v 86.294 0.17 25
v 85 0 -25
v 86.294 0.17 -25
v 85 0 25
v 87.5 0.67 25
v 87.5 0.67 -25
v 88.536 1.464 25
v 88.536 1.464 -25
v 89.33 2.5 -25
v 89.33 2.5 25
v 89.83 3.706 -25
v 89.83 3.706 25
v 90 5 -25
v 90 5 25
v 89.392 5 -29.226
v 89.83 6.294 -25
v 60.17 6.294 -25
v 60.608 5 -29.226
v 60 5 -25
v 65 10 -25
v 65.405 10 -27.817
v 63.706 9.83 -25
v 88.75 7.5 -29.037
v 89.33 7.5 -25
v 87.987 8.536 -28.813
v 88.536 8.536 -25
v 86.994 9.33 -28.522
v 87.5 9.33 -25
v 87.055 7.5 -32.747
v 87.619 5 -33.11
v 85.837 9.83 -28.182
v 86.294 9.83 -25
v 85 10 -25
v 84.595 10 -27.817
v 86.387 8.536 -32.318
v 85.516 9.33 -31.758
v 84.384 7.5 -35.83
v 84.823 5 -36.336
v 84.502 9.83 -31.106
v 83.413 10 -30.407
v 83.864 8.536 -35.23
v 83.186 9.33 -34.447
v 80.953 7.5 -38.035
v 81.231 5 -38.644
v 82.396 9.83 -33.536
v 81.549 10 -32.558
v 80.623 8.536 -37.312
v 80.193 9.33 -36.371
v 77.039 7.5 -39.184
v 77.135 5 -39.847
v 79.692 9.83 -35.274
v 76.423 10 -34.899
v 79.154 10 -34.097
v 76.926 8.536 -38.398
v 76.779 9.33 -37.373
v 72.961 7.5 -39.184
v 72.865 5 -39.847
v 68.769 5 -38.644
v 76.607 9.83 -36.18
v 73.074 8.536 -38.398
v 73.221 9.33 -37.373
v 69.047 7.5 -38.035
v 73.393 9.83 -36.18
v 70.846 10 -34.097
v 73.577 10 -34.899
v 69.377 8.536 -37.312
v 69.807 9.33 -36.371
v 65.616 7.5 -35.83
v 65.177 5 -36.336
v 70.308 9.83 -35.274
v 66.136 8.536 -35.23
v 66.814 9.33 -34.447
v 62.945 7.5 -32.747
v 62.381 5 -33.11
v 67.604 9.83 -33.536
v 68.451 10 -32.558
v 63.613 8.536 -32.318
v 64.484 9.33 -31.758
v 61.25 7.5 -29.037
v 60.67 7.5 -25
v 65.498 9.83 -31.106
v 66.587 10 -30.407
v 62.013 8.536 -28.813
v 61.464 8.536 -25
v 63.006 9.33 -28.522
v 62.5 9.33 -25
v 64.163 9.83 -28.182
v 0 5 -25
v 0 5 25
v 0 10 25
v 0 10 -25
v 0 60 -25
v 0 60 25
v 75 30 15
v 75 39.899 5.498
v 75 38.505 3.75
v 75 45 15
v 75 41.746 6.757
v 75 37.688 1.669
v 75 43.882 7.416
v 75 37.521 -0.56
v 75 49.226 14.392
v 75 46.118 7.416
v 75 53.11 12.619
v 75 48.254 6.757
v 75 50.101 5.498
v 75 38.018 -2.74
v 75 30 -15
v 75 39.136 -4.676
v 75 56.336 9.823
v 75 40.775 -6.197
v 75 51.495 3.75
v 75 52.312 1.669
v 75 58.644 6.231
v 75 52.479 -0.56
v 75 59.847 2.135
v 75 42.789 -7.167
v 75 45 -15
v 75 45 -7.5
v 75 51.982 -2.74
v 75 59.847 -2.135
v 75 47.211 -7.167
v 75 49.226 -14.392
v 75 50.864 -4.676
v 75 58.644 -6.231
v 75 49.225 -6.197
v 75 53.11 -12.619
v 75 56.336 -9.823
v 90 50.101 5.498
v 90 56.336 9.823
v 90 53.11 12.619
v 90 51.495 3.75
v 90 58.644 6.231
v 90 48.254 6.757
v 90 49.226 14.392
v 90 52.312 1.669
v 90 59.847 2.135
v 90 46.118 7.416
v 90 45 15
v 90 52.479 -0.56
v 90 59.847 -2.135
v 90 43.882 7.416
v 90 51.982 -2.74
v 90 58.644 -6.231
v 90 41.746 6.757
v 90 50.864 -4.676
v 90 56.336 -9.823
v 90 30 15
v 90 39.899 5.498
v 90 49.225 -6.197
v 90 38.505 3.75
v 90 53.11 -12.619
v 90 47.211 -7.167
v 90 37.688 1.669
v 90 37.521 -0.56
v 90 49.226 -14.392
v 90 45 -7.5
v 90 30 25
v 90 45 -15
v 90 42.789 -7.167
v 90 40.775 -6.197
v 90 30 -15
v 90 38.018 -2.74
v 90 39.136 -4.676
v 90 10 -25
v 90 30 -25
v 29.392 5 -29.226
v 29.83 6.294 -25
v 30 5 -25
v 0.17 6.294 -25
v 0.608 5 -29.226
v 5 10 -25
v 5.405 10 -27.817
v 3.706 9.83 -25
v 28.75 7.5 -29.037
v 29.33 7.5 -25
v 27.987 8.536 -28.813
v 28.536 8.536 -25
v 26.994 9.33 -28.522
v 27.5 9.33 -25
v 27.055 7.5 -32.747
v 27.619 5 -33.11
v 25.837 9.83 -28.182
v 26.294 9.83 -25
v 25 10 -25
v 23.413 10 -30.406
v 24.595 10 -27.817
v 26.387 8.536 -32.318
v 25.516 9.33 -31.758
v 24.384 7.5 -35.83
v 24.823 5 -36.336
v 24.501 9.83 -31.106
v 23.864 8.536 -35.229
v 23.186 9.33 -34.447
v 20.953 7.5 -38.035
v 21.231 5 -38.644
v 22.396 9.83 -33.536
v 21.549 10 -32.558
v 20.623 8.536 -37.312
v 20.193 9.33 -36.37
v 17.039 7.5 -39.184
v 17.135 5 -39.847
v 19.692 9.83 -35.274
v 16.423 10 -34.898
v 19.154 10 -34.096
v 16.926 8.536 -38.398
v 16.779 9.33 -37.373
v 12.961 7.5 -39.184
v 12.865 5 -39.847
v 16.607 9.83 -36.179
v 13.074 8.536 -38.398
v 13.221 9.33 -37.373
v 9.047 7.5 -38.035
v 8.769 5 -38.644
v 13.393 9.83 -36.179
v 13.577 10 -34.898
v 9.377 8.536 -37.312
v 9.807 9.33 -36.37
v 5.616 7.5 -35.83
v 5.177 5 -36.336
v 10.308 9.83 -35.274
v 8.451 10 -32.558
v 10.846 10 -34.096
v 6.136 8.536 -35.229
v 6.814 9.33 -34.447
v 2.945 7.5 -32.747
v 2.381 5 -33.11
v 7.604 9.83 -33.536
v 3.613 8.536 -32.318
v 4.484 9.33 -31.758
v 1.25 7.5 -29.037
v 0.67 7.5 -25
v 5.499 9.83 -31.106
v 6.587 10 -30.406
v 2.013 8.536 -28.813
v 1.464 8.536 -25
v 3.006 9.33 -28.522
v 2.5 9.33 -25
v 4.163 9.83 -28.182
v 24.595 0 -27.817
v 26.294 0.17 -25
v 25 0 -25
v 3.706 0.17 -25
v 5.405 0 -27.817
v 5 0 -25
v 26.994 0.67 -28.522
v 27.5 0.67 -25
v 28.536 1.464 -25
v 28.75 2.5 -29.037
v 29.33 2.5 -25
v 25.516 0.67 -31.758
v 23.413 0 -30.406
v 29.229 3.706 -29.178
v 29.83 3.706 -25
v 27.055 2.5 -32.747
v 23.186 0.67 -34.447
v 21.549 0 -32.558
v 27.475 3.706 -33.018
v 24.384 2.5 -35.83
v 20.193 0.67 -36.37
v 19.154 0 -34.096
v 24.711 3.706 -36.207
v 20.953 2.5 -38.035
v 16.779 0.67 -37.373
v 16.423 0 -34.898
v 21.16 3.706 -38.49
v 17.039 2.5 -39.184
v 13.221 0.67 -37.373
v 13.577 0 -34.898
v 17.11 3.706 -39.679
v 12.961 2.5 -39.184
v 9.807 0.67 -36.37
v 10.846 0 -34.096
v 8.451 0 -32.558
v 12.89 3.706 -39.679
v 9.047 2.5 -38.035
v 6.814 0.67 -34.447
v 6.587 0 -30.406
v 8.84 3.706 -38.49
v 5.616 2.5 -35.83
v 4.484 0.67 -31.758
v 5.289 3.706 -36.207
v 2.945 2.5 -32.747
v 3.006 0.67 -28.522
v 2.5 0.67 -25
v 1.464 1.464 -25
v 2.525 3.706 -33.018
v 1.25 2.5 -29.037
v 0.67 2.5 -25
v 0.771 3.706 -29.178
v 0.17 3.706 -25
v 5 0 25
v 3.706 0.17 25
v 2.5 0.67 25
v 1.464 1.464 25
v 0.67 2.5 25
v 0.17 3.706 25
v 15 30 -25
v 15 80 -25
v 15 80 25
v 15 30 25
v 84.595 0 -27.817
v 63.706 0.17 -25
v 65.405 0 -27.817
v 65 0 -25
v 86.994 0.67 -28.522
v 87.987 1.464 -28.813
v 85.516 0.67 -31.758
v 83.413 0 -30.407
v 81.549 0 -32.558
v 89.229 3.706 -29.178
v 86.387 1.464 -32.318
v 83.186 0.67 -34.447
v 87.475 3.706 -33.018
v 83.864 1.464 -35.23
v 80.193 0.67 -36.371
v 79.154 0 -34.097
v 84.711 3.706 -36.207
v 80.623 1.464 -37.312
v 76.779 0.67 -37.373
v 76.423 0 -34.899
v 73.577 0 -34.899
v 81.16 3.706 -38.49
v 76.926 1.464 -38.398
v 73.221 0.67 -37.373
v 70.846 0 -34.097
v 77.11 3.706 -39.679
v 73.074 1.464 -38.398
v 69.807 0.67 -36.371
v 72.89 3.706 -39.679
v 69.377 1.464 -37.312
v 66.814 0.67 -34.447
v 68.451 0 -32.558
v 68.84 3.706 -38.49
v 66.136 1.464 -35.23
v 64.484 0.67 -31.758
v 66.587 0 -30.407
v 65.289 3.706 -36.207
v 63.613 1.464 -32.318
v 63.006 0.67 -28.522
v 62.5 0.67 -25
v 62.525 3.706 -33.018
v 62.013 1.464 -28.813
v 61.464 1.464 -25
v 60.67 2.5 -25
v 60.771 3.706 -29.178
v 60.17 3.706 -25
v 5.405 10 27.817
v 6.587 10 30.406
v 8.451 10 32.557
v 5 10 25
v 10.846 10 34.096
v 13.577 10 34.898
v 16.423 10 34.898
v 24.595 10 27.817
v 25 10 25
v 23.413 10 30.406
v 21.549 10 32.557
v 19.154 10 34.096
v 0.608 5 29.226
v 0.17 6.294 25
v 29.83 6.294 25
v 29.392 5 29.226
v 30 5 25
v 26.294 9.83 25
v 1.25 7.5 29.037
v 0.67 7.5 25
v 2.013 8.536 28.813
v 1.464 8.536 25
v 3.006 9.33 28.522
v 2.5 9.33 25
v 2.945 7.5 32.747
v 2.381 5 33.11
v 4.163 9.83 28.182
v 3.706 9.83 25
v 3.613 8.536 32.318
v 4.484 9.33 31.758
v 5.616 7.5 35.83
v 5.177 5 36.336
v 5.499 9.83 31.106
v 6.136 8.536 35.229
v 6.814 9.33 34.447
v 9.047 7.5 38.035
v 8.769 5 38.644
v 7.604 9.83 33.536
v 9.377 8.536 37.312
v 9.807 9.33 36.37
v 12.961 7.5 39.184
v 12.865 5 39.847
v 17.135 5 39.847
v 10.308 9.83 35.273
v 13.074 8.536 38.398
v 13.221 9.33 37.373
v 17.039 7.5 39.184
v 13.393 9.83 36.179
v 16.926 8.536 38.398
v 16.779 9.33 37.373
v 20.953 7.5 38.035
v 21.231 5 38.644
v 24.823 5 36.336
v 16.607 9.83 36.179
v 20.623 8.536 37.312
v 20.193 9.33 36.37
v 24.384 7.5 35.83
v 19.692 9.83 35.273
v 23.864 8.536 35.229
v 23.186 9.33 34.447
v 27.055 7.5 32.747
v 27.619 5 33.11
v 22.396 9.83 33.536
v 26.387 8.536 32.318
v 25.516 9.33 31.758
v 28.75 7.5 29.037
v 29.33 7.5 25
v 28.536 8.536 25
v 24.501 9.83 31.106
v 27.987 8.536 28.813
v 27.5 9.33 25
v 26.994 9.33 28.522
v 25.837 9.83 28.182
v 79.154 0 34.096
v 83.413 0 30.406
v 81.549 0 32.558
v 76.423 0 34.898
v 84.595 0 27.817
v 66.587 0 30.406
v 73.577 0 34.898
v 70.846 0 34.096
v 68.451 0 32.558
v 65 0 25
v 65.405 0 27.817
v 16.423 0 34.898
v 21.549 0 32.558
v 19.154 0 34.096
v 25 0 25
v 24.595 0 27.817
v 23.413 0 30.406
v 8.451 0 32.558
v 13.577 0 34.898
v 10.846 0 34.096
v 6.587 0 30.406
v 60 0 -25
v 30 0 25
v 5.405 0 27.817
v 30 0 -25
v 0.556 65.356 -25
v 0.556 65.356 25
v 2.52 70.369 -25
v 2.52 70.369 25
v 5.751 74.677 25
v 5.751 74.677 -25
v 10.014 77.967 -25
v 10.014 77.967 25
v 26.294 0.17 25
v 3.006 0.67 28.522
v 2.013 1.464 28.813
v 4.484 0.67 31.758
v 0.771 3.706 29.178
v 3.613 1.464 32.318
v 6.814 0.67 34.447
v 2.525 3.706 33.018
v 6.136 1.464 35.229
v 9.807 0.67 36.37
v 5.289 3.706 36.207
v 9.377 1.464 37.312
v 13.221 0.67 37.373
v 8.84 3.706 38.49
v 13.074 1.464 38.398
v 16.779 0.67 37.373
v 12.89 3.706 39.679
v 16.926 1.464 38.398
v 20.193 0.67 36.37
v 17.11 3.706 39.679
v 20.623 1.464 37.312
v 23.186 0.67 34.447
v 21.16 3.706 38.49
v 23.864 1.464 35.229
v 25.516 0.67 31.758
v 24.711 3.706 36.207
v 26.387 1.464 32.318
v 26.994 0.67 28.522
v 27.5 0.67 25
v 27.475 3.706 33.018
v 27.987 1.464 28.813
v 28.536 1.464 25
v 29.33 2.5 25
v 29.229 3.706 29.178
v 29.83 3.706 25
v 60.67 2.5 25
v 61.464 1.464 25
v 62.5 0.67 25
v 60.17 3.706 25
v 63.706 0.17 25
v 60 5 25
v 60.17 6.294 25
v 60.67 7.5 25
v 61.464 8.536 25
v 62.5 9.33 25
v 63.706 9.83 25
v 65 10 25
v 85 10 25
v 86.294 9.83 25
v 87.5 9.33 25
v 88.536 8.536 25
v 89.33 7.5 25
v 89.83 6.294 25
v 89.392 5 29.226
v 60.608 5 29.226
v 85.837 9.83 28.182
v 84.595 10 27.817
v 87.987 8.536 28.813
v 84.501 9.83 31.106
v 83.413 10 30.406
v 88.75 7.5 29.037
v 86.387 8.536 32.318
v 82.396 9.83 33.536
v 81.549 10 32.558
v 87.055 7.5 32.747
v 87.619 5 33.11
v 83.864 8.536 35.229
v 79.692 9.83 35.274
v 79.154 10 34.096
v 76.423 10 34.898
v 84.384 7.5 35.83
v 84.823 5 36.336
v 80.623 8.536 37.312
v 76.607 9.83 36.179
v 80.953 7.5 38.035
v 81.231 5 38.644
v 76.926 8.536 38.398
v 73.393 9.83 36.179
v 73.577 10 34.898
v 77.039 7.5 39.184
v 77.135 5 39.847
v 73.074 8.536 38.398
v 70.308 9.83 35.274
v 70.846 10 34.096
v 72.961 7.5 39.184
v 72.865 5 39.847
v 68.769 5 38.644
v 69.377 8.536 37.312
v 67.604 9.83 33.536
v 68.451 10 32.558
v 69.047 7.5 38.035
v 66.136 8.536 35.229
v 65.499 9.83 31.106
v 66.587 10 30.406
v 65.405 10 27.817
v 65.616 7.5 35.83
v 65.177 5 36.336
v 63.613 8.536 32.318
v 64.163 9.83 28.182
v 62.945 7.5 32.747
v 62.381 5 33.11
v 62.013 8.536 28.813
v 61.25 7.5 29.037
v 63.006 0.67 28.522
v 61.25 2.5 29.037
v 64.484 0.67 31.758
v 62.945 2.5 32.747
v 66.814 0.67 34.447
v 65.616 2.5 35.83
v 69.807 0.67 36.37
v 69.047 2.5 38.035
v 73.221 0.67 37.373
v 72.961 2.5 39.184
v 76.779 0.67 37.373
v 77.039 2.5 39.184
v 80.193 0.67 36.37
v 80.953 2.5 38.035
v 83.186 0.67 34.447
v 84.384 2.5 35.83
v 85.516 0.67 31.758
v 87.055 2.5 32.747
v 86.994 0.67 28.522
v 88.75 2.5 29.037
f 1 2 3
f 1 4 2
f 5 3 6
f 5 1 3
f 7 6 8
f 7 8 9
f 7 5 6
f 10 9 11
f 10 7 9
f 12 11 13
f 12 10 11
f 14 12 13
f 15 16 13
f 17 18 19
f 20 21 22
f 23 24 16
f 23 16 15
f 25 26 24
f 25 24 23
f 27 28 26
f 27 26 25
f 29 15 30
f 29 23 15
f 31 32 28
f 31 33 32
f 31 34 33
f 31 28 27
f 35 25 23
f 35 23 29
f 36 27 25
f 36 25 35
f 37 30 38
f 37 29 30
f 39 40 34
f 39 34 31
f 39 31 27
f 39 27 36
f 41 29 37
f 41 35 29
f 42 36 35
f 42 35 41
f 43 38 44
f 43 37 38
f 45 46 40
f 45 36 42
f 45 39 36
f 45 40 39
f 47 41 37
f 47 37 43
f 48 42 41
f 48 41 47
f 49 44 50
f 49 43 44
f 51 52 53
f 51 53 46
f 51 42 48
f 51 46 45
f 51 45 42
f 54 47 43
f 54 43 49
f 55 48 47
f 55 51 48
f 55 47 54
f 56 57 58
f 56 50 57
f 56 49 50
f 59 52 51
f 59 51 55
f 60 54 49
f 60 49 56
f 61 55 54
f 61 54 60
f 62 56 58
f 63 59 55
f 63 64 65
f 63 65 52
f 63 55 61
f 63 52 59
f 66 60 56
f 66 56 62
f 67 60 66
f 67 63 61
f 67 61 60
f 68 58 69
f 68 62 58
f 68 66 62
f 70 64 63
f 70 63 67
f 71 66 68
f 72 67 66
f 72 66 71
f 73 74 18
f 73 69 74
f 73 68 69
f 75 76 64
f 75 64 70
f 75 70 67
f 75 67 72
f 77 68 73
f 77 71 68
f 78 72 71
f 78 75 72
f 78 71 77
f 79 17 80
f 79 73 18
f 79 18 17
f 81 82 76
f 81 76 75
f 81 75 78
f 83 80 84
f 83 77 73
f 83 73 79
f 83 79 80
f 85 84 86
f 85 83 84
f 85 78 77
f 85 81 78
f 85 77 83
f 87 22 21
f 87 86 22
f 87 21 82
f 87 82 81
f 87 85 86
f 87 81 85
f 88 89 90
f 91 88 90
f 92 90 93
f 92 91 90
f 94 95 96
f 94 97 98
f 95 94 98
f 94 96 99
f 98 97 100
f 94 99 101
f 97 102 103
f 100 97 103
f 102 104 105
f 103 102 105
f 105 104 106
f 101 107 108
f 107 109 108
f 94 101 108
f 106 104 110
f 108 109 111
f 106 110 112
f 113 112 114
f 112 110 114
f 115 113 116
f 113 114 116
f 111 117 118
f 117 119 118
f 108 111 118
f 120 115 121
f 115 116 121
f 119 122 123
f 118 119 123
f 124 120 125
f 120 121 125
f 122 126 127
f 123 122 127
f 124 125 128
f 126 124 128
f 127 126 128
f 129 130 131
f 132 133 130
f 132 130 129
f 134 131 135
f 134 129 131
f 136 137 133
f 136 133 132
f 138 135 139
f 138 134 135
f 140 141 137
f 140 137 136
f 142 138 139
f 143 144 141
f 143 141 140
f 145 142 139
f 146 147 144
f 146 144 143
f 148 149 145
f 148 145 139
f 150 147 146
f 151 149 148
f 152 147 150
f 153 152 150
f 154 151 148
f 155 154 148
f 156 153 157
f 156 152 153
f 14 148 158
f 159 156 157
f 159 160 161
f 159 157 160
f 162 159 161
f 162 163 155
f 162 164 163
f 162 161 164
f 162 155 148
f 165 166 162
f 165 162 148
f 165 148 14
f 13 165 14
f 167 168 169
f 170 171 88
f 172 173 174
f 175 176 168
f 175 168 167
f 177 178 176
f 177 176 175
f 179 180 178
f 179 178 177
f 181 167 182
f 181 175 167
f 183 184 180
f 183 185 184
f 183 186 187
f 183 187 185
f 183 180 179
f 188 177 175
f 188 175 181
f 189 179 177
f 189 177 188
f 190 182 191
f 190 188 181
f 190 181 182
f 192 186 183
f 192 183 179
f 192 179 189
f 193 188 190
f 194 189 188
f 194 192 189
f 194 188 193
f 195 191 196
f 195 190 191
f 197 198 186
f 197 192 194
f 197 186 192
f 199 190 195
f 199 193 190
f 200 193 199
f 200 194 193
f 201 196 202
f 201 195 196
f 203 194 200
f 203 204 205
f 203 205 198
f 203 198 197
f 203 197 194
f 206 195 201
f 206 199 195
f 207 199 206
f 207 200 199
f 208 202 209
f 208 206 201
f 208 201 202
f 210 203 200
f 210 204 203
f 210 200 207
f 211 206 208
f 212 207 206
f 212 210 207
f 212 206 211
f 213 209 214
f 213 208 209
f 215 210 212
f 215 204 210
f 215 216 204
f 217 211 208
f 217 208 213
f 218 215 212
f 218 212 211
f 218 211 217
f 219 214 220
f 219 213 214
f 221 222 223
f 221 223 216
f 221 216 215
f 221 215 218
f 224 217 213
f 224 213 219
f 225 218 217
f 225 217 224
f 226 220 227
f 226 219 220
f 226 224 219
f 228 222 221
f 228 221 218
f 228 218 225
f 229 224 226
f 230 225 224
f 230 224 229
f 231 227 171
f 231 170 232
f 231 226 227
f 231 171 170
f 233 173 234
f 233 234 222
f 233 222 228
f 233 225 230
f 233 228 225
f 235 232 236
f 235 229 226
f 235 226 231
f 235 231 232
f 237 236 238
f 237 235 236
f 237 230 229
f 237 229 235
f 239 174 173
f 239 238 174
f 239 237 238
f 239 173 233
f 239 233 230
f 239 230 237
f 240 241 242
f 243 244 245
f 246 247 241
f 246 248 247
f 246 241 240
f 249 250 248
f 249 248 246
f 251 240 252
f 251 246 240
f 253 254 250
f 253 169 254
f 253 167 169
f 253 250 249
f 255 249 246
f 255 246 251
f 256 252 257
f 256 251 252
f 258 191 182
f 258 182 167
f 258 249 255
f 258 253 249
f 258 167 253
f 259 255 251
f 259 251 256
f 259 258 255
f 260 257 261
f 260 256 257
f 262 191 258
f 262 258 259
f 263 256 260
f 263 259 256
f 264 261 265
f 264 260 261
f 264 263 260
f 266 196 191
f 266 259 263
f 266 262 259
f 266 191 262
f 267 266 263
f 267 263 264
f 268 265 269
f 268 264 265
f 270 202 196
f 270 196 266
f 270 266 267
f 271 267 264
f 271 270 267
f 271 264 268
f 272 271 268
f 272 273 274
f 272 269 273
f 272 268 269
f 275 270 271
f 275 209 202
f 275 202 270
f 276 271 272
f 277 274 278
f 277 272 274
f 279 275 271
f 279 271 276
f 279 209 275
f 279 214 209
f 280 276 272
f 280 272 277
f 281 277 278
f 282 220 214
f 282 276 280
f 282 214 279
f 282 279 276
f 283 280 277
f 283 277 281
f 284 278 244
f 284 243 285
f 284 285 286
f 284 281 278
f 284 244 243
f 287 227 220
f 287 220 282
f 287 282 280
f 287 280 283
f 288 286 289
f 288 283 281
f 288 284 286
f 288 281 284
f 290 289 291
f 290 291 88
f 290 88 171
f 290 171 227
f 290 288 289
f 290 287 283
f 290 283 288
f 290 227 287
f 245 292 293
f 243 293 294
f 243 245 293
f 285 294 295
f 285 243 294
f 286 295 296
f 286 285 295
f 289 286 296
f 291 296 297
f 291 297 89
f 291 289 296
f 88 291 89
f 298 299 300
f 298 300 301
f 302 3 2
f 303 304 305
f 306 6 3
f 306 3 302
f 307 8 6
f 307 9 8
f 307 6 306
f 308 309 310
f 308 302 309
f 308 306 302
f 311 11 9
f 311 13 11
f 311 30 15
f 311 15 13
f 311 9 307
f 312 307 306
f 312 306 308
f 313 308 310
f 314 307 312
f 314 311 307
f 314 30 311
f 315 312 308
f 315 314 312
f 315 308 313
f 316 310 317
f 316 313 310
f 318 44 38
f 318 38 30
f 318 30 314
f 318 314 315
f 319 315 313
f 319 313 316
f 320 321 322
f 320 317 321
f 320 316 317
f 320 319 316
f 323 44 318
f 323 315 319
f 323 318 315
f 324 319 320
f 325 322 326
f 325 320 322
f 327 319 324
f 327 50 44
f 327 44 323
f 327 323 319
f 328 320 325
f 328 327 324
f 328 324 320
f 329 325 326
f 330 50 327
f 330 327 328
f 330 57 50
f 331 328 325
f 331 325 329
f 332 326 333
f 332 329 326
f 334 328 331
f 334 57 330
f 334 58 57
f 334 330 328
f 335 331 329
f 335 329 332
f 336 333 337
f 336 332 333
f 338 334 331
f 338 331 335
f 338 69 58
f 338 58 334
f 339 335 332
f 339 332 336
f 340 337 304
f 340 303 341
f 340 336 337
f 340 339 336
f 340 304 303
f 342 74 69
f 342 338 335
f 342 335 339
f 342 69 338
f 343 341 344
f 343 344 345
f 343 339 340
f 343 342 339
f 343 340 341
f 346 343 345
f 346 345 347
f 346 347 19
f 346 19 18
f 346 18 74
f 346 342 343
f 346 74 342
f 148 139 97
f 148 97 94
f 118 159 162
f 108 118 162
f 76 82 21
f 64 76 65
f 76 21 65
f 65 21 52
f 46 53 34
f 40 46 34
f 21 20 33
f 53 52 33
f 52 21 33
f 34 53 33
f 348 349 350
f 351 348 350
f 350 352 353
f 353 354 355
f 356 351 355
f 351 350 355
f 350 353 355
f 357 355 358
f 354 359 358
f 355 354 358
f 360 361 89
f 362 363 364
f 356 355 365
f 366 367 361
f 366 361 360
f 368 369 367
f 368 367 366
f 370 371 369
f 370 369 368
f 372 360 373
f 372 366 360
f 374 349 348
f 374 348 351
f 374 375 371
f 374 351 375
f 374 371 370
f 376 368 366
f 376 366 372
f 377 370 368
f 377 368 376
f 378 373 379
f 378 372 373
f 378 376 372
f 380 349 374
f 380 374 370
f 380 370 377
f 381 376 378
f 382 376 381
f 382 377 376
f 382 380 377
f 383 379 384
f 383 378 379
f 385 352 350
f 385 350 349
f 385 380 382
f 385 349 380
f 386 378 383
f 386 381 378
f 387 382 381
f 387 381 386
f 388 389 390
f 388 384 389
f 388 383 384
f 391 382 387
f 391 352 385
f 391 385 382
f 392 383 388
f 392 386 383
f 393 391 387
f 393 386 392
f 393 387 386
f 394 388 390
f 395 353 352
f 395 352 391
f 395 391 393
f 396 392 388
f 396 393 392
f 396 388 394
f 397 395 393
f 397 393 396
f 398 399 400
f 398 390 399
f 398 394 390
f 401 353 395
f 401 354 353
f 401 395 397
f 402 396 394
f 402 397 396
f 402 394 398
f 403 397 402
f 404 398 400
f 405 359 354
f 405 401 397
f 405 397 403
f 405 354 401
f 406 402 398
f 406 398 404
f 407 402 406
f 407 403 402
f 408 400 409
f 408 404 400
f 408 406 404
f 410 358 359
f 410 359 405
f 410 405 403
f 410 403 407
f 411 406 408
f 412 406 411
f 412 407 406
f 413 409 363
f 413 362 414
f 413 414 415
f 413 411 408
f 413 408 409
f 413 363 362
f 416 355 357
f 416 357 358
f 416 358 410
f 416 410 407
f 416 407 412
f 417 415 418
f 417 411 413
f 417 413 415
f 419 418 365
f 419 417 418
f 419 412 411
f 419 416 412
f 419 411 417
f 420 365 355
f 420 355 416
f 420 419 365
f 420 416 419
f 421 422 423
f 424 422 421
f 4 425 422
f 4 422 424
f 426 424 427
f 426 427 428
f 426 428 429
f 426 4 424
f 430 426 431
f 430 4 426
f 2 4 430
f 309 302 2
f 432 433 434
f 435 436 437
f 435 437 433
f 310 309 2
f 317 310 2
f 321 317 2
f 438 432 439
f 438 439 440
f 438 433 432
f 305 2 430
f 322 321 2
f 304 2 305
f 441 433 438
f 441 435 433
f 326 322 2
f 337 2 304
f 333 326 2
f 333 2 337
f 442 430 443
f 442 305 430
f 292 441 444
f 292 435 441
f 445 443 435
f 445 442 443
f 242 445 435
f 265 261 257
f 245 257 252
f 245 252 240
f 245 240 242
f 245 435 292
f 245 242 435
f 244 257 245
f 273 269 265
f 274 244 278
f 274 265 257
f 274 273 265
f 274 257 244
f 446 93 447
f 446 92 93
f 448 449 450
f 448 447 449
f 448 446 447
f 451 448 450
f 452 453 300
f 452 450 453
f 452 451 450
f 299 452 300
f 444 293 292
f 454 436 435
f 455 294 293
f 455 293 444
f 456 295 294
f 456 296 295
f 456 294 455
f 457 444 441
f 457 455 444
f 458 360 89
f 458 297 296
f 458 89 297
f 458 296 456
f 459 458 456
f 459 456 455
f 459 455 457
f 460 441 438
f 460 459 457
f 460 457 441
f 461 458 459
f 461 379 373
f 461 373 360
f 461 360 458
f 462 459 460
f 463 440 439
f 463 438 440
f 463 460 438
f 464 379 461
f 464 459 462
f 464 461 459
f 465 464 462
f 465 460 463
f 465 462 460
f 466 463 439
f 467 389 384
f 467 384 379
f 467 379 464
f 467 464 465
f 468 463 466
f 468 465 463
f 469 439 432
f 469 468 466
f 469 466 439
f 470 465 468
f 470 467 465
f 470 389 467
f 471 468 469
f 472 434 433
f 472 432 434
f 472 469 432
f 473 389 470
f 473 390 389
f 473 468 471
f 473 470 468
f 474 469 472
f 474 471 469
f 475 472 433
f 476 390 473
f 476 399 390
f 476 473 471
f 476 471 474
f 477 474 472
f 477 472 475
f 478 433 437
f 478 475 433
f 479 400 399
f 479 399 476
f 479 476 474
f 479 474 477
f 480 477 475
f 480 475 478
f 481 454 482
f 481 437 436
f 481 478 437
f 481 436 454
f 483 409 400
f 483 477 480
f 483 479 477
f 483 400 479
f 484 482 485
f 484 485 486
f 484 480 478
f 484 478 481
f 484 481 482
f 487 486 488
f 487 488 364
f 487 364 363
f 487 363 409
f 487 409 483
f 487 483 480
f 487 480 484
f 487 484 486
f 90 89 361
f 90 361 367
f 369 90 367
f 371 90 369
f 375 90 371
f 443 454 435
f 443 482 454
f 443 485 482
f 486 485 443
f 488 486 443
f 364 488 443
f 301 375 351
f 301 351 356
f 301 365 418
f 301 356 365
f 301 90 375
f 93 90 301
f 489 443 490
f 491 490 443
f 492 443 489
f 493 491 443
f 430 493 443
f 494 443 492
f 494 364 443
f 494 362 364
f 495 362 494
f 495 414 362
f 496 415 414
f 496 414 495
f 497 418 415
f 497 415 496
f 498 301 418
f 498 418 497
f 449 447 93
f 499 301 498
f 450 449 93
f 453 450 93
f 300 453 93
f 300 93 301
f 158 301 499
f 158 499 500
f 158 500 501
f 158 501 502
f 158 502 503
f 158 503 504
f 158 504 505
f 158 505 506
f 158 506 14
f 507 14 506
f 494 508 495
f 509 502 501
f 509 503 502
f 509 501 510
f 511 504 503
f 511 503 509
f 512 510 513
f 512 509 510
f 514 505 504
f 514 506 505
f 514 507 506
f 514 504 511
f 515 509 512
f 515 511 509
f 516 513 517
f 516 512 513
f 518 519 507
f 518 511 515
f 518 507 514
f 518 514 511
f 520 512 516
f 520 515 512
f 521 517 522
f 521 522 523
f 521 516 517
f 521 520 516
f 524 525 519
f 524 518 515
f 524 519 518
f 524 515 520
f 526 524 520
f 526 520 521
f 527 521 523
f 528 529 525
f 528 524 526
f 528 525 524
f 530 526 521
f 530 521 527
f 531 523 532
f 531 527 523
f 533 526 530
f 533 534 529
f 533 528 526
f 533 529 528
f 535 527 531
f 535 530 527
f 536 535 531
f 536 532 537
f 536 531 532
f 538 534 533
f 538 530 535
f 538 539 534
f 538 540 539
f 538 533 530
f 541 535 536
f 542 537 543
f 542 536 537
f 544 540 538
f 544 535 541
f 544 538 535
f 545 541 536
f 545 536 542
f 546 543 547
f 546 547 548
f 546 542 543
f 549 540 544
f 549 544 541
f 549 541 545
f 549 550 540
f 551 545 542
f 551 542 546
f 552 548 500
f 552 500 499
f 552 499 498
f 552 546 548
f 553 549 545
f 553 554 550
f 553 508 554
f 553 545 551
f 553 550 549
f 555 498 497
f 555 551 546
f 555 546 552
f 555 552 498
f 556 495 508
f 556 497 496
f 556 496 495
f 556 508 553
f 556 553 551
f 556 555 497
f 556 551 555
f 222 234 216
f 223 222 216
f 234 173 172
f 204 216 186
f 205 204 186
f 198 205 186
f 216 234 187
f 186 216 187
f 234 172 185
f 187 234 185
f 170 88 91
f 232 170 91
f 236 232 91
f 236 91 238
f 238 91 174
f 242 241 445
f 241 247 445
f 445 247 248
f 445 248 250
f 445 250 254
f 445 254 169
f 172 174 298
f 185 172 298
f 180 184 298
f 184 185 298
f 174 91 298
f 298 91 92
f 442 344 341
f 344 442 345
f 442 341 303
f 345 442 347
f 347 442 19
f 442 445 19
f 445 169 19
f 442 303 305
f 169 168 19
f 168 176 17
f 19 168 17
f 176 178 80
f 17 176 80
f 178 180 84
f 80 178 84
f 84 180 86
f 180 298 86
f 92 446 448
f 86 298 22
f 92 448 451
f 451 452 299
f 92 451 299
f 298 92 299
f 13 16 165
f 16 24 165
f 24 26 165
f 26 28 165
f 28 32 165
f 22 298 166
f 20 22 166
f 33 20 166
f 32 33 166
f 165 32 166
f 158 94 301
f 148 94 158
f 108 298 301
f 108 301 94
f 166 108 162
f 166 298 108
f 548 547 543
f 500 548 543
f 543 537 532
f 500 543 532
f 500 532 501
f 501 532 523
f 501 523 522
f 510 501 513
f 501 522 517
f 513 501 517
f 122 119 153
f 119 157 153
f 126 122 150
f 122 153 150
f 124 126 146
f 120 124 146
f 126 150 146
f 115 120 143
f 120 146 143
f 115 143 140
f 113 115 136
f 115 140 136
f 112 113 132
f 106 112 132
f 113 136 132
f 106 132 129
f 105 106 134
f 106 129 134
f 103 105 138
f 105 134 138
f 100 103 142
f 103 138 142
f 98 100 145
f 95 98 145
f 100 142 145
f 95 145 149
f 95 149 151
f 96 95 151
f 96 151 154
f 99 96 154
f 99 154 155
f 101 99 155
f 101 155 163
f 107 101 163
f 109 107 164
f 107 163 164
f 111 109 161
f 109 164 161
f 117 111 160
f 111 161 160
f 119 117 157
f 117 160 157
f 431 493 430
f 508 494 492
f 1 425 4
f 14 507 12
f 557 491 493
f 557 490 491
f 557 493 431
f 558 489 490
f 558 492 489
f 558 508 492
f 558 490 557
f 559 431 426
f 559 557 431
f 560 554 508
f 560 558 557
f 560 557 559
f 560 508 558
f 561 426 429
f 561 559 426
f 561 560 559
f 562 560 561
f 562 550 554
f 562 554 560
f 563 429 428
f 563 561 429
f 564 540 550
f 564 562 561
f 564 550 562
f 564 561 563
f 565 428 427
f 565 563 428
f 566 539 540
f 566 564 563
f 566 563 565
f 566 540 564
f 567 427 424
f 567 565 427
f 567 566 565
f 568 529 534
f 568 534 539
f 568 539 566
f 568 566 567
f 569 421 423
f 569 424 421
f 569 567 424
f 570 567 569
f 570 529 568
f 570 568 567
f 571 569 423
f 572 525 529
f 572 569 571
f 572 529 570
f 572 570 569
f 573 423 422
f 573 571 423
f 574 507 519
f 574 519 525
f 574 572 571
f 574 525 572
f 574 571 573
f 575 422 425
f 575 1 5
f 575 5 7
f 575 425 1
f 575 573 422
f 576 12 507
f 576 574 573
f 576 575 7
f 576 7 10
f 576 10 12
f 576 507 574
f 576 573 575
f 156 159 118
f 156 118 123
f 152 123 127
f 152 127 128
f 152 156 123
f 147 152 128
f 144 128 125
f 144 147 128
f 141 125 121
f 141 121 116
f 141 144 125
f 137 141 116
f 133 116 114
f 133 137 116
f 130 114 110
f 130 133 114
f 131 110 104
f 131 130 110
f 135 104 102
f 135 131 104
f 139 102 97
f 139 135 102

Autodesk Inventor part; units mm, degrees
ref_plane "YZ Plane" through (0, 0, 0) normal (1, 0, 0) x (0, 1, 0)
ref_plane "XZ Plane" through (0, 0, 0) normal (0, 1, 0) x (-1, 0, 0)
ref_plane "XY Plane" through (0, 0, 0) normal (0, 0, 1) x (1, 0, 0)
sketch "Sketch1" plane through (0, 0, 0) normal (0, 0, 1) x (1, 0, 0)
  line L0 (0, 0) -> (0, 60)
  line L1 (15, 80) -> (15, 30)
  line L2 (15, 30) -> (90, 30)
  line L3 (90, 30) -> (90, 0)
  line L4 (90, 0) -> (0, 0)
  arc A0 (15, 80) -> (0, 60) centre (19.99, 60.6325) ccw
  dimension "d0" = 60
  dimension "d1" = 90
  dimension "d2" = 30
  dimension "d3" = 75
  dimension "d4" = 50
  dimension "d5" = 20
extrude "Extrusion1" add sketch "Sketch1" along normal mid plane 50
sketch "Sketch2" plane through (90, 0, 25) normal (1, 0, 0) x (0, 0, -1)
  line L0 (50, 30) -> (0, 30) projected
  arc A0 (40, 45) -> (10, 45) centre (25, 45) ccw
  line L1 (50, 0) -> (0, 0) projected
  line L2 (50, 80) -> (50, 30) projected
  line L3 (10, 45) -> (10, 30)
  line L4 (40, 45) -> (40, 30)
  circle A1 centre (25, 45) radius 7.5
  point P0 (25, 0)
  dimension "d10" = 45
  dimension "d11" = 25
  dimension "d13" = 15
  dimension "d14" = 15
extrude "Extrusion2" add sketch "Sketch2" against normal blind 15
sketch "Sketch3" plane through (0, 0, 25) normal (0, 0, 1) x (1, 0, 0)
  point P0 (0, 0)
sketch "Sketch5" plane through (0, 0, 25) normal (0, -1, 0) x (1, 0, 0)
  line L0 (90, 0) -> (15, 0) projected
  line L1 (0, 0) -> (90, 0) projected
  circle A0 centre (15, 0) radius 15
  circle A1 centre (75, 0) radius 15
  point P0 (0, -25)
  point P1 (60, 0)
  point P2 (30, 0)
  dimension "d18" = 30
extrude "Extrusion3" add sketch "Sketch5" against normal blind 10 contours L0 L1 A0 | L0 A1 picked at (5.1453, 1.1966) picked at (70.6847, 5.6392)
full round fillet "Full Round Fillet2" first side at (70, 10, 31.6312) centre faces at (60.1942, 3.3333, 27.4062) second side at (50, 0, -8.3333)
sketch "Sketch7" plane through (0, 0, -25) normal (0, -1, 0) x (1, 0, 0)
  line L0 (15, 0) -> (90, 0) projected
  line L1 (90, 0) -> (0, 0) projected
  circle A0 centre (15, 0) radius 15
  circle A1 centre (75, 0) radius 15
  line L2 (0, 0) -> (0, 50) projected
  line L3 (90, 0) -> (90, 50) projected
  point P0 (0, 25)
  point P1 (30, 0)
  point P2 (60, 0)
  dimension "d21" = 30
  dimension "d22" = 30
extrude "Extrusion4" add sketch "Sketch7" against normal blind 10 contours L0 A0 L1 | L0 A1 picked at (24.8547, -1.1966) picked at (78.2678, -7.6351)
full round fillet "Full Round Fillet4" first side at (18.8878, 10, -29.5122) centre faces at (29.9514, 6.6667, -26.207) second side at (51.6666, 0, 8.3333)
fillet "Fillet1" radius 5 1 edges at (15, 10, 40)
fillet "Fillet2" radius 5 2 edges at (75, 10, -40) (75, 0, -40)
properties part number "Lab 1B A"
